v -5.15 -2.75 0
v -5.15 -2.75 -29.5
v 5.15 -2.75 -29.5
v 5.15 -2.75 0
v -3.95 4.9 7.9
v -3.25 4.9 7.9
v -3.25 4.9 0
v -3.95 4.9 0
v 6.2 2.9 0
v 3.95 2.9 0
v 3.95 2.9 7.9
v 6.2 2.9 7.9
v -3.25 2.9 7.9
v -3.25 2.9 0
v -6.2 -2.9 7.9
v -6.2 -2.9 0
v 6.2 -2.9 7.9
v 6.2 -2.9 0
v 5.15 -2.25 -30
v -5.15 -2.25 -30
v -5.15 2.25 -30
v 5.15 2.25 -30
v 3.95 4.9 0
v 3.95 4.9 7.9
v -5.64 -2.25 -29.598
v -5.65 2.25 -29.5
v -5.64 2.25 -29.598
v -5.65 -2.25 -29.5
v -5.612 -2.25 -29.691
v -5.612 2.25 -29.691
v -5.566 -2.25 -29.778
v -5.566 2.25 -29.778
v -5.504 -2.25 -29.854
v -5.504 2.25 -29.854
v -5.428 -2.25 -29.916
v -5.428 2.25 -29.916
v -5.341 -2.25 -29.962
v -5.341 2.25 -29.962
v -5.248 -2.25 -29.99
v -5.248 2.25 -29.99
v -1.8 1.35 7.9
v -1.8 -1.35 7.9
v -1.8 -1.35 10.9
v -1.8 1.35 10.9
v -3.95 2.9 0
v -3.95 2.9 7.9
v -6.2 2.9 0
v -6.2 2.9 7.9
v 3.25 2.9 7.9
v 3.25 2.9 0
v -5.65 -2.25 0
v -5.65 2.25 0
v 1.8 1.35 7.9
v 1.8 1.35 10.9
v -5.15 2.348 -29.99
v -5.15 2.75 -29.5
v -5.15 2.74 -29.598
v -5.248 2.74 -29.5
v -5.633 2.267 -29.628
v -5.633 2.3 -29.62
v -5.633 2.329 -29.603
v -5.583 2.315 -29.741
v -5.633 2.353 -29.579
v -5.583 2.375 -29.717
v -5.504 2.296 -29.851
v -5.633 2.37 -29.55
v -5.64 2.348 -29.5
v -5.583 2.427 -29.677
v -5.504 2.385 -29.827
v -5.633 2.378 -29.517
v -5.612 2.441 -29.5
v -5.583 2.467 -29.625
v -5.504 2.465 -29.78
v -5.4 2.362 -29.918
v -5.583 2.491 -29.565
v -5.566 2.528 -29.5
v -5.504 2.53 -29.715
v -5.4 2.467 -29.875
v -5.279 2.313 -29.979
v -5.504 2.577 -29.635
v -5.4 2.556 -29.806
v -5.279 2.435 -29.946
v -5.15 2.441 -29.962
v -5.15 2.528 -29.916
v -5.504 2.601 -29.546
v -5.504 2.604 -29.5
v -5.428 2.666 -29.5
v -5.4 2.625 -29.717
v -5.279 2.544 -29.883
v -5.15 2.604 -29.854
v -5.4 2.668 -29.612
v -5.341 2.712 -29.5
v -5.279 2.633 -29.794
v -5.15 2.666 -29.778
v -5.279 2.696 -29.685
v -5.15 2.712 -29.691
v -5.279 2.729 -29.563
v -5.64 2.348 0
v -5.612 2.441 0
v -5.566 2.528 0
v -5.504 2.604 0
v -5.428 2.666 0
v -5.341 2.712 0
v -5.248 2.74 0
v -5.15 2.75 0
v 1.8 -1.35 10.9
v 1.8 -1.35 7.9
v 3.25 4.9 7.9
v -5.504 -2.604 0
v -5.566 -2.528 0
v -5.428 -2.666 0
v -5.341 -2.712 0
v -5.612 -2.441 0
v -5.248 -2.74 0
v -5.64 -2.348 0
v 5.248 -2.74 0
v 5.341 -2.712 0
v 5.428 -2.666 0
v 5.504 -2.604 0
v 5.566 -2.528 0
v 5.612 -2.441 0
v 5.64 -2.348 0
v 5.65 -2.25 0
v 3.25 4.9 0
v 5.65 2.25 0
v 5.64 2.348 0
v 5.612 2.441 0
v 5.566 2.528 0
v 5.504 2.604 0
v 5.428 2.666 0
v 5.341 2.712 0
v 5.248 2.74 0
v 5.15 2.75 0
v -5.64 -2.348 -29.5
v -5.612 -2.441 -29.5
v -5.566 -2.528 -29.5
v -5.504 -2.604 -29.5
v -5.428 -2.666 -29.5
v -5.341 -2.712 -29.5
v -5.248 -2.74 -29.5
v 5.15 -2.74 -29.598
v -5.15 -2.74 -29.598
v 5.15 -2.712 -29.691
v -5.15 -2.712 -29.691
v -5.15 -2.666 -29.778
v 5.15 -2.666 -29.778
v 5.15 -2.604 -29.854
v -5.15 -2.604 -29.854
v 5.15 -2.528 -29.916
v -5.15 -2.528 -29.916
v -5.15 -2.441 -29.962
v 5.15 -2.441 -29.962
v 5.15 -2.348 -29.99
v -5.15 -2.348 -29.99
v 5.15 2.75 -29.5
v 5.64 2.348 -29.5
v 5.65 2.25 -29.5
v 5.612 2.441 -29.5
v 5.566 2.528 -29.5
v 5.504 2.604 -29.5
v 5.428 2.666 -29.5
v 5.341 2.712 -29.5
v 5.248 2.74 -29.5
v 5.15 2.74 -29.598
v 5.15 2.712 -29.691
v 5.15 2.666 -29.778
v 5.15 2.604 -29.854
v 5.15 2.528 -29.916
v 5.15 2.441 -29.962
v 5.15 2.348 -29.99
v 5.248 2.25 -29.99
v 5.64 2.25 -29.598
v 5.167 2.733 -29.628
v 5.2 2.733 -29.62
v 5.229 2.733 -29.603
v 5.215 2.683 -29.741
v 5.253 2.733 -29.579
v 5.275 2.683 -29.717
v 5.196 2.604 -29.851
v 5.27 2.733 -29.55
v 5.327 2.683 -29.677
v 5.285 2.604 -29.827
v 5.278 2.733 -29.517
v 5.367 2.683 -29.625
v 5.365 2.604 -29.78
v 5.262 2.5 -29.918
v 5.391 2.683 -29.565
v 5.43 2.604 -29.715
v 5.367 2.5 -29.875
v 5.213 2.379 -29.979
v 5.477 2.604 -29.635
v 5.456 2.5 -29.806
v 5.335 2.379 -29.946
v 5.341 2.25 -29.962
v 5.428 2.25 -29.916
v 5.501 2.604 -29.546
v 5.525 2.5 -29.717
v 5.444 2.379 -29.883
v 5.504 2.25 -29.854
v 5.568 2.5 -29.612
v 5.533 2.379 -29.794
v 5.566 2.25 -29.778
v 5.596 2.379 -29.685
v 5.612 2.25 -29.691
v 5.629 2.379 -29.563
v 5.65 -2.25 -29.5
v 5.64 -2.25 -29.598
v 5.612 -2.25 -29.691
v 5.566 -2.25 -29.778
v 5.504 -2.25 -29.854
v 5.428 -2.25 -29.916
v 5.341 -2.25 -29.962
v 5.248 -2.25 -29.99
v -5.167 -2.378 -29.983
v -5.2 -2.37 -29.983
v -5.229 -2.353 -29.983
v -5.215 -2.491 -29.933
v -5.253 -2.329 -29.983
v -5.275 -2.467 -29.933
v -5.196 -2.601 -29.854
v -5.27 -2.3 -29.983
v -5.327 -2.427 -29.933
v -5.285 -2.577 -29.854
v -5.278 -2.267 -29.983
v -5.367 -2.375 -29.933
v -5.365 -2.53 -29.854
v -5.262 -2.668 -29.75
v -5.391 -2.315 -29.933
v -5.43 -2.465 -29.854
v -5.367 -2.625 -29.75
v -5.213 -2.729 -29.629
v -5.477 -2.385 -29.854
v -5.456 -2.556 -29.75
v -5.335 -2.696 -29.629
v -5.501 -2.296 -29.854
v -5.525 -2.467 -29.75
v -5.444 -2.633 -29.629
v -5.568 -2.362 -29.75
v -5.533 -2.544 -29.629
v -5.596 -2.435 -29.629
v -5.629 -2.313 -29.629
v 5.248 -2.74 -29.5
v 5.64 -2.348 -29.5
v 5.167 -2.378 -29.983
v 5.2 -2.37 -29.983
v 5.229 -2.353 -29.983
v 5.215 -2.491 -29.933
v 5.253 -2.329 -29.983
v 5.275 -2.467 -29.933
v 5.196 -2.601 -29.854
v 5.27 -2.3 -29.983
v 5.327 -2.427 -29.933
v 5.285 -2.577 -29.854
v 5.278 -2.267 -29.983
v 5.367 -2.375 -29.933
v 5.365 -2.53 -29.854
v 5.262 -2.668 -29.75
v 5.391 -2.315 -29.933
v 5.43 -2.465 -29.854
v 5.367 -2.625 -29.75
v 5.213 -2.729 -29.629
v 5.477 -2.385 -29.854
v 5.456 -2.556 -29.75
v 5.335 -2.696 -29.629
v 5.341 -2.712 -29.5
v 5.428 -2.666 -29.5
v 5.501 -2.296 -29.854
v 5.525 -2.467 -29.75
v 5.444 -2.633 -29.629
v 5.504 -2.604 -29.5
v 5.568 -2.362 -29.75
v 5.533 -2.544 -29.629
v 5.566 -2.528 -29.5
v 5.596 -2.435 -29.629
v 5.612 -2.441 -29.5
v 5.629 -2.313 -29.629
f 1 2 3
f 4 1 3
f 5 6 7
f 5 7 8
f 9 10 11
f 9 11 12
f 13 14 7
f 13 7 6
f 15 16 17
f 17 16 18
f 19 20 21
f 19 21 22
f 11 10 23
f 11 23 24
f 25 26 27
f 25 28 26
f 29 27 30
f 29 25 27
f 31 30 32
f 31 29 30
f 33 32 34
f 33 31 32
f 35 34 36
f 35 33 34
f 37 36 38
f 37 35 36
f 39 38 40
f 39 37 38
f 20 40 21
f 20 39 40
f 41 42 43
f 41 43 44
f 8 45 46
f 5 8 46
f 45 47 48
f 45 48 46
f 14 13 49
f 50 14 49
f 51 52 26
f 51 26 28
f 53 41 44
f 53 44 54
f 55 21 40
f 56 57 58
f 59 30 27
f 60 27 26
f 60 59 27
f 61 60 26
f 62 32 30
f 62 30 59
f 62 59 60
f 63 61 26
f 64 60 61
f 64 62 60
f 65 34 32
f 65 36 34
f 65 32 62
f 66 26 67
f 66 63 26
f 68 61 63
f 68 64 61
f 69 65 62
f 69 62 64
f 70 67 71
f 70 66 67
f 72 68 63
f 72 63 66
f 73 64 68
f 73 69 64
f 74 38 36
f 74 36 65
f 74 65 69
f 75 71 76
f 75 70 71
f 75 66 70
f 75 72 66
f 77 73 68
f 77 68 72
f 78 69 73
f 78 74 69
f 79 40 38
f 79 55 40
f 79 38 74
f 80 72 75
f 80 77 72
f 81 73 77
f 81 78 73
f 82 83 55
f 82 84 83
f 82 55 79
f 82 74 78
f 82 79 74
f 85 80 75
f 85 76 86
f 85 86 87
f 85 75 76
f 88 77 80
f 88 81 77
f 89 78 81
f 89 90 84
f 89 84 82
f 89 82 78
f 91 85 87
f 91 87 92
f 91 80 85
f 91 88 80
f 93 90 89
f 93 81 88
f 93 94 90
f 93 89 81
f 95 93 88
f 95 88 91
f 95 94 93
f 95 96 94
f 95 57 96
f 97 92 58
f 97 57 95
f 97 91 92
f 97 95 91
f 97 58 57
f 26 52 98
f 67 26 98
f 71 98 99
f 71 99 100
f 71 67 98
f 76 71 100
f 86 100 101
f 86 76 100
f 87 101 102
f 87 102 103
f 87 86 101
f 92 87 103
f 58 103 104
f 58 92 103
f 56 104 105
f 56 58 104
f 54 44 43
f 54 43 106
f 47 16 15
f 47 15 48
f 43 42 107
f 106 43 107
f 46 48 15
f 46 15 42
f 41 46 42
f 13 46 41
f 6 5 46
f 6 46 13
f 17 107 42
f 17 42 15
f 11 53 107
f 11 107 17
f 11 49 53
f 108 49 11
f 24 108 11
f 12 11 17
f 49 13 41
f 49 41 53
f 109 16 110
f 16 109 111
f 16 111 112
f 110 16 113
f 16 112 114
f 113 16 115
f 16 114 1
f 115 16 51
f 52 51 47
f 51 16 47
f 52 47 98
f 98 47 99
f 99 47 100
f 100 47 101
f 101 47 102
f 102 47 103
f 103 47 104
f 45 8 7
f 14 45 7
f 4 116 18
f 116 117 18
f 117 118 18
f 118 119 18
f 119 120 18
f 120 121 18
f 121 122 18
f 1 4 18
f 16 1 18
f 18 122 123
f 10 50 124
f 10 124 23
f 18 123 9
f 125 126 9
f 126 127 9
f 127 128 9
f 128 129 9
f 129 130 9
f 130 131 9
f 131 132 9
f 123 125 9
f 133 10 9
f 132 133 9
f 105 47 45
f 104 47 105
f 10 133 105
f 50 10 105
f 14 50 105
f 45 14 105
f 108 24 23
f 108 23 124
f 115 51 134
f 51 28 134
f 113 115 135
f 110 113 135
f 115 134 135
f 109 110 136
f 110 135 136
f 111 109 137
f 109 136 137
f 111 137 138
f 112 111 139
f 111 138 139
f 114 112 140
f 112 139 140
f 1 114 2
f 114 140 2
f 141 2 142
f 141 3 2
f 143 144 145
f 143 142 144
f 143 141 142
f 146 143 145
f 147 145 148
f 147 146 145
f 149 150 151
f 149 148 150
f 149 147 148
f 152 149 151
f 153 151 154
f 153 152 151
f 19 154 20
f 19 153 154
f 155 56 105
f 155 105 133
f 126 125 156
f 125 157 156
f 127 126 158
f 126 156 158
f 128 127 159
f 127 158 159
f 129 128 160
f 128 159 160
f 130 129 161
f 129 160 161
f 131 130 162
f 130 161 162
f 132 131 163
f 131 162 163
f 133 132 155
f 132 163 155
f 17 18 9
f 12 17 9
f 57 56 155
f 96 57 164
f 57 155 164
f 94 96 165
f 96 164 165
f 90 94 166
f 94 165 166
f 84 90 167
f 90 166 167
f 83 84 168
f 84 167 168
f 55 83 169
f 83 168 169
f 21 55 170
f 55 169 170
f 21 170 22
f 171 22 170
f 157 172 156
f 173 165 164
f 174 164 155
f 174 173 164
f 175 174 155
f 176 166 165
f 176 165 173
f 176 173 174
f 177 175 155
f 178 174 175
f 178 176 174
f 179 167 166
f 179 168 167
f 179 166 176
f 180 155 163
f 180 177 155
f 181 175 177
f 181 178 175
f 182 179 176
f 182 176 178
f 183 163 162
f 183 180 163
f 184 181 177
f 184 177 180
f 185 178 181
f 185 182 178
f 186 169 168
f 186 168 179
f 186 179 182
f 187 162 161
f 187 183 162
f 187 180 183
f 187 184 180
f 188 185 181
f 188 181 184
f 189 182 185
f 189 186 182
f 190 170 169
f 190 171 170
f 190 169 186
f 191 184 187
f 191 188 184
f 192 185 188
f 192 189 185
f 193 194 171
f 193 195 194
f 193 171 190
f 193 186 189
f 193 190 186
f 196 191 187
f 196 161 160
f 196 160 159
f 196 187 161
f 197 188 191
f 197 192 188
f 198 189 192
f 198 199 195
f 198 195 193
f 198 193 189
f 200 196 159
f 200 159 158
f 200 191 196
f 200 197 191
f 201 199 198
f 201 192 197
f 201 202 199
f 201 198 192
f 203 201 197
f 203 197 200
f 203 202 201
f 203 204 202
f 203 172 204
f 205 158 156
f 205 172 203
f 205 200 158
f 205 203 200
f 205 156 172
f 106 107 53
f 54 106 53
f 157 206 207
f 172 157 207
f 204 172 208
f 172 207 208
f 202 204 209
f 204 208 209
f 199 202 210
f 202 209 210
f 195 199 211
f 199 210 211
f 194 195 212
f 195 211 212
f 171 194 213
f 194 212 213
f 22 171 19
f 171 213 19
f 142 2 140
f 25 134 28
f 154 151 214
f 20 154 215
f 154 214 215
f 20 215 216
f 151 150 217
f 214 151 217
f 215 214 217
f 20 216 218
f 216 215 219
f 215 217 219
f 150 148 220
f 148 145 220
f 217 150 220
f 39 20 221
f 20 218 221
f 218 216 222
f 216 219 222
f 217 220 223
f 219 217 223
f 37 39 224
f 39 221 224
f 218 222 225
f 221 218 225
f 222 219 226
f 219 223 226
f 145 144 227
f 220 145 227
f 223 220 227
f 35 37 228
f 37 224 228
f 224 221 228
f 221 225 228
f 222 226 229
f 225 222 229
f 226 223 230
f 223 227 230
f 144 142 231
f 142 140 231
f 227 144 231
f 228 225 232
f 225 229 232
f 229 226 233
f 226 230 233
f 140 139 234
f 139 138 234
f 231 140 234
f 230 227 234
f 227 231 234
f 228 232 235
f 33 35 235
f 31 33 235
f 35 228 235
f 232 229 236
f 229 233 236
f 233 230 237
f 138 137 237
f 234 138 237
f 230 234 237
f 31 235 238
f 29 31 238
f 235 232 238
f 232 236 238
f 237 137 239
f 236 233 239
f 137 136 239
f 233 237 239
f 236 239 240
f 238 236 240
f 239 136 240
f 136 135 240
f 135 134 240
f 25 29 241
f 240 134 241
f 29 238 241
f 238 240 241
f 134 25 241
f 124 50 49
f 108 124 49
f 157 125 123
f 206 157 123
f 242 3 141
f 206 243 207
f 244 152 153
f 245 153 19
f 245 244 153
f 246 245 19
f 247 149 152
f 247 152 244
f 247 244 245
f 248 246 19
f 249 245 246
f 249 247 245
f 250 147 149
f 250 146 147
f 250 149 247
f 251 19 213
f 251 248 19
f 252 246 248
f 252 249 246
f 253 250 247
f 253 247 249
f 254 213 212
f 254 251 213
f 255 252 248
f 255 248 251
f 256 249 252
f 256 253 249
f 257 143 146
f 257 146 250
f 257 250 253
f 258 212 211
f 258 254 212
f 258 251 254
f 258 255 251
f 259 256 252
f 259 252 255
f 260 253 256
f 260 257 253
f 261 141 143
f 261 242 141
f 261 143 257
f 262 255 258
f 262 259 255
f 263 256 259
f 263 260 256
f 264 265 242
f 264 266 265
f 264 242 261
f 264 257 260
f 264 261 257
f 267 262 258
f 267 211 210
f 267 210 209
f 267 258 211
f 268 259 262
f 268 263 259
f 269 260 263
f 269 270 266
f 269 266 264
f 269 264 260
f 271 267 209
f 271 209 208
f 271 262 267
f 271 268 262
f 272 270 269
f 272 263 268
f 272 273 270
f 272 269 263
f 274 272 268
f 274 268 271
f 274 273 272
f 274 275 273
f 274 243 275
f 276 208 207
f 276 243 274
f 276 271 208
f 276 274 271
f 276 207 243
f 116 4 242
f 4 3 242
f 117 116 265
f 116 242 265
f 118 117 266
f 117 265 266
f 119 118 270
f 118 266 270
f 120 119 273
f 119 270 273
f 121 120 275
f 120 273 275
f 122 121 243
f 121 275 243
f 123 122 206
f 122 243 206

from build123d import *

# Parameters (mm, degrees)
F0_W     = 12.4
F0_H     = 5.8
F1_DEPTH = 7.9
F2_W     = 11.3
F2_H     = 5.5
F3_DEPTH = 30
F4_R     = 0.5
F5_W     = 3.6
F5_H     = 2.7
F6_DEPTH = 3
F7_W     = 0.7
F7_H     = 7.9
F8_DEPTH = 2


with BuildPart() as f1:
    # F0 (on Top) → F1 (new body)
    with BuildSketch(Plane.XY):
        Rectangle(F0_W, F0_H)
    extrude(amount=F1_DEPTH)

    # F2 (on face) → F3 (join)
    with BuildSketch(Plane(origin=(0, 0, 0), x_dir=(1, 0, 0), z_dir=(0, 0, -1))):
        Rectangle(F2_W, F2_H)
    extrude(amount=F3_DEPTH)

    # F4
    f4_edges = [f1.edges().sort_by_distance(p)[0] for p in [
        (-5.65, -2.75, -15),
        (5.65, -2.75, -15),
        (0, -2.75, -30),
        (5.65, 0, -30),
        (0, 2.75, -30),
        (-5.65, 0, -30),
        (5.65, 2.75, -15),
        (-5.65, 2.75, -15),
    ]]
    fillet(f4_edges, radius=F4_R)

    # F5 (on face) → F6 (join)
    with BuildSketch(Plane.XY.offset(7.9)):
        Rectangle(F5_W, F5_H)
    extrude(amount=F6_DEPTH)

    # F7 (on face) → F8 (join)
    with BuildSketch(Plane(origin=(0, 2.9, 0), x_dir=(-1, 0, 0), z_dir=(0, 1, 0))):
        with Locations((3.6, 3.95)):
            Rectangle(F7_W, F7_H)
        with Locations((-3.6, 3.95)):
            Rectangle(F7_W, F7_H)
    extrude(amount=F8_DEPTH)


solid = f1.part
